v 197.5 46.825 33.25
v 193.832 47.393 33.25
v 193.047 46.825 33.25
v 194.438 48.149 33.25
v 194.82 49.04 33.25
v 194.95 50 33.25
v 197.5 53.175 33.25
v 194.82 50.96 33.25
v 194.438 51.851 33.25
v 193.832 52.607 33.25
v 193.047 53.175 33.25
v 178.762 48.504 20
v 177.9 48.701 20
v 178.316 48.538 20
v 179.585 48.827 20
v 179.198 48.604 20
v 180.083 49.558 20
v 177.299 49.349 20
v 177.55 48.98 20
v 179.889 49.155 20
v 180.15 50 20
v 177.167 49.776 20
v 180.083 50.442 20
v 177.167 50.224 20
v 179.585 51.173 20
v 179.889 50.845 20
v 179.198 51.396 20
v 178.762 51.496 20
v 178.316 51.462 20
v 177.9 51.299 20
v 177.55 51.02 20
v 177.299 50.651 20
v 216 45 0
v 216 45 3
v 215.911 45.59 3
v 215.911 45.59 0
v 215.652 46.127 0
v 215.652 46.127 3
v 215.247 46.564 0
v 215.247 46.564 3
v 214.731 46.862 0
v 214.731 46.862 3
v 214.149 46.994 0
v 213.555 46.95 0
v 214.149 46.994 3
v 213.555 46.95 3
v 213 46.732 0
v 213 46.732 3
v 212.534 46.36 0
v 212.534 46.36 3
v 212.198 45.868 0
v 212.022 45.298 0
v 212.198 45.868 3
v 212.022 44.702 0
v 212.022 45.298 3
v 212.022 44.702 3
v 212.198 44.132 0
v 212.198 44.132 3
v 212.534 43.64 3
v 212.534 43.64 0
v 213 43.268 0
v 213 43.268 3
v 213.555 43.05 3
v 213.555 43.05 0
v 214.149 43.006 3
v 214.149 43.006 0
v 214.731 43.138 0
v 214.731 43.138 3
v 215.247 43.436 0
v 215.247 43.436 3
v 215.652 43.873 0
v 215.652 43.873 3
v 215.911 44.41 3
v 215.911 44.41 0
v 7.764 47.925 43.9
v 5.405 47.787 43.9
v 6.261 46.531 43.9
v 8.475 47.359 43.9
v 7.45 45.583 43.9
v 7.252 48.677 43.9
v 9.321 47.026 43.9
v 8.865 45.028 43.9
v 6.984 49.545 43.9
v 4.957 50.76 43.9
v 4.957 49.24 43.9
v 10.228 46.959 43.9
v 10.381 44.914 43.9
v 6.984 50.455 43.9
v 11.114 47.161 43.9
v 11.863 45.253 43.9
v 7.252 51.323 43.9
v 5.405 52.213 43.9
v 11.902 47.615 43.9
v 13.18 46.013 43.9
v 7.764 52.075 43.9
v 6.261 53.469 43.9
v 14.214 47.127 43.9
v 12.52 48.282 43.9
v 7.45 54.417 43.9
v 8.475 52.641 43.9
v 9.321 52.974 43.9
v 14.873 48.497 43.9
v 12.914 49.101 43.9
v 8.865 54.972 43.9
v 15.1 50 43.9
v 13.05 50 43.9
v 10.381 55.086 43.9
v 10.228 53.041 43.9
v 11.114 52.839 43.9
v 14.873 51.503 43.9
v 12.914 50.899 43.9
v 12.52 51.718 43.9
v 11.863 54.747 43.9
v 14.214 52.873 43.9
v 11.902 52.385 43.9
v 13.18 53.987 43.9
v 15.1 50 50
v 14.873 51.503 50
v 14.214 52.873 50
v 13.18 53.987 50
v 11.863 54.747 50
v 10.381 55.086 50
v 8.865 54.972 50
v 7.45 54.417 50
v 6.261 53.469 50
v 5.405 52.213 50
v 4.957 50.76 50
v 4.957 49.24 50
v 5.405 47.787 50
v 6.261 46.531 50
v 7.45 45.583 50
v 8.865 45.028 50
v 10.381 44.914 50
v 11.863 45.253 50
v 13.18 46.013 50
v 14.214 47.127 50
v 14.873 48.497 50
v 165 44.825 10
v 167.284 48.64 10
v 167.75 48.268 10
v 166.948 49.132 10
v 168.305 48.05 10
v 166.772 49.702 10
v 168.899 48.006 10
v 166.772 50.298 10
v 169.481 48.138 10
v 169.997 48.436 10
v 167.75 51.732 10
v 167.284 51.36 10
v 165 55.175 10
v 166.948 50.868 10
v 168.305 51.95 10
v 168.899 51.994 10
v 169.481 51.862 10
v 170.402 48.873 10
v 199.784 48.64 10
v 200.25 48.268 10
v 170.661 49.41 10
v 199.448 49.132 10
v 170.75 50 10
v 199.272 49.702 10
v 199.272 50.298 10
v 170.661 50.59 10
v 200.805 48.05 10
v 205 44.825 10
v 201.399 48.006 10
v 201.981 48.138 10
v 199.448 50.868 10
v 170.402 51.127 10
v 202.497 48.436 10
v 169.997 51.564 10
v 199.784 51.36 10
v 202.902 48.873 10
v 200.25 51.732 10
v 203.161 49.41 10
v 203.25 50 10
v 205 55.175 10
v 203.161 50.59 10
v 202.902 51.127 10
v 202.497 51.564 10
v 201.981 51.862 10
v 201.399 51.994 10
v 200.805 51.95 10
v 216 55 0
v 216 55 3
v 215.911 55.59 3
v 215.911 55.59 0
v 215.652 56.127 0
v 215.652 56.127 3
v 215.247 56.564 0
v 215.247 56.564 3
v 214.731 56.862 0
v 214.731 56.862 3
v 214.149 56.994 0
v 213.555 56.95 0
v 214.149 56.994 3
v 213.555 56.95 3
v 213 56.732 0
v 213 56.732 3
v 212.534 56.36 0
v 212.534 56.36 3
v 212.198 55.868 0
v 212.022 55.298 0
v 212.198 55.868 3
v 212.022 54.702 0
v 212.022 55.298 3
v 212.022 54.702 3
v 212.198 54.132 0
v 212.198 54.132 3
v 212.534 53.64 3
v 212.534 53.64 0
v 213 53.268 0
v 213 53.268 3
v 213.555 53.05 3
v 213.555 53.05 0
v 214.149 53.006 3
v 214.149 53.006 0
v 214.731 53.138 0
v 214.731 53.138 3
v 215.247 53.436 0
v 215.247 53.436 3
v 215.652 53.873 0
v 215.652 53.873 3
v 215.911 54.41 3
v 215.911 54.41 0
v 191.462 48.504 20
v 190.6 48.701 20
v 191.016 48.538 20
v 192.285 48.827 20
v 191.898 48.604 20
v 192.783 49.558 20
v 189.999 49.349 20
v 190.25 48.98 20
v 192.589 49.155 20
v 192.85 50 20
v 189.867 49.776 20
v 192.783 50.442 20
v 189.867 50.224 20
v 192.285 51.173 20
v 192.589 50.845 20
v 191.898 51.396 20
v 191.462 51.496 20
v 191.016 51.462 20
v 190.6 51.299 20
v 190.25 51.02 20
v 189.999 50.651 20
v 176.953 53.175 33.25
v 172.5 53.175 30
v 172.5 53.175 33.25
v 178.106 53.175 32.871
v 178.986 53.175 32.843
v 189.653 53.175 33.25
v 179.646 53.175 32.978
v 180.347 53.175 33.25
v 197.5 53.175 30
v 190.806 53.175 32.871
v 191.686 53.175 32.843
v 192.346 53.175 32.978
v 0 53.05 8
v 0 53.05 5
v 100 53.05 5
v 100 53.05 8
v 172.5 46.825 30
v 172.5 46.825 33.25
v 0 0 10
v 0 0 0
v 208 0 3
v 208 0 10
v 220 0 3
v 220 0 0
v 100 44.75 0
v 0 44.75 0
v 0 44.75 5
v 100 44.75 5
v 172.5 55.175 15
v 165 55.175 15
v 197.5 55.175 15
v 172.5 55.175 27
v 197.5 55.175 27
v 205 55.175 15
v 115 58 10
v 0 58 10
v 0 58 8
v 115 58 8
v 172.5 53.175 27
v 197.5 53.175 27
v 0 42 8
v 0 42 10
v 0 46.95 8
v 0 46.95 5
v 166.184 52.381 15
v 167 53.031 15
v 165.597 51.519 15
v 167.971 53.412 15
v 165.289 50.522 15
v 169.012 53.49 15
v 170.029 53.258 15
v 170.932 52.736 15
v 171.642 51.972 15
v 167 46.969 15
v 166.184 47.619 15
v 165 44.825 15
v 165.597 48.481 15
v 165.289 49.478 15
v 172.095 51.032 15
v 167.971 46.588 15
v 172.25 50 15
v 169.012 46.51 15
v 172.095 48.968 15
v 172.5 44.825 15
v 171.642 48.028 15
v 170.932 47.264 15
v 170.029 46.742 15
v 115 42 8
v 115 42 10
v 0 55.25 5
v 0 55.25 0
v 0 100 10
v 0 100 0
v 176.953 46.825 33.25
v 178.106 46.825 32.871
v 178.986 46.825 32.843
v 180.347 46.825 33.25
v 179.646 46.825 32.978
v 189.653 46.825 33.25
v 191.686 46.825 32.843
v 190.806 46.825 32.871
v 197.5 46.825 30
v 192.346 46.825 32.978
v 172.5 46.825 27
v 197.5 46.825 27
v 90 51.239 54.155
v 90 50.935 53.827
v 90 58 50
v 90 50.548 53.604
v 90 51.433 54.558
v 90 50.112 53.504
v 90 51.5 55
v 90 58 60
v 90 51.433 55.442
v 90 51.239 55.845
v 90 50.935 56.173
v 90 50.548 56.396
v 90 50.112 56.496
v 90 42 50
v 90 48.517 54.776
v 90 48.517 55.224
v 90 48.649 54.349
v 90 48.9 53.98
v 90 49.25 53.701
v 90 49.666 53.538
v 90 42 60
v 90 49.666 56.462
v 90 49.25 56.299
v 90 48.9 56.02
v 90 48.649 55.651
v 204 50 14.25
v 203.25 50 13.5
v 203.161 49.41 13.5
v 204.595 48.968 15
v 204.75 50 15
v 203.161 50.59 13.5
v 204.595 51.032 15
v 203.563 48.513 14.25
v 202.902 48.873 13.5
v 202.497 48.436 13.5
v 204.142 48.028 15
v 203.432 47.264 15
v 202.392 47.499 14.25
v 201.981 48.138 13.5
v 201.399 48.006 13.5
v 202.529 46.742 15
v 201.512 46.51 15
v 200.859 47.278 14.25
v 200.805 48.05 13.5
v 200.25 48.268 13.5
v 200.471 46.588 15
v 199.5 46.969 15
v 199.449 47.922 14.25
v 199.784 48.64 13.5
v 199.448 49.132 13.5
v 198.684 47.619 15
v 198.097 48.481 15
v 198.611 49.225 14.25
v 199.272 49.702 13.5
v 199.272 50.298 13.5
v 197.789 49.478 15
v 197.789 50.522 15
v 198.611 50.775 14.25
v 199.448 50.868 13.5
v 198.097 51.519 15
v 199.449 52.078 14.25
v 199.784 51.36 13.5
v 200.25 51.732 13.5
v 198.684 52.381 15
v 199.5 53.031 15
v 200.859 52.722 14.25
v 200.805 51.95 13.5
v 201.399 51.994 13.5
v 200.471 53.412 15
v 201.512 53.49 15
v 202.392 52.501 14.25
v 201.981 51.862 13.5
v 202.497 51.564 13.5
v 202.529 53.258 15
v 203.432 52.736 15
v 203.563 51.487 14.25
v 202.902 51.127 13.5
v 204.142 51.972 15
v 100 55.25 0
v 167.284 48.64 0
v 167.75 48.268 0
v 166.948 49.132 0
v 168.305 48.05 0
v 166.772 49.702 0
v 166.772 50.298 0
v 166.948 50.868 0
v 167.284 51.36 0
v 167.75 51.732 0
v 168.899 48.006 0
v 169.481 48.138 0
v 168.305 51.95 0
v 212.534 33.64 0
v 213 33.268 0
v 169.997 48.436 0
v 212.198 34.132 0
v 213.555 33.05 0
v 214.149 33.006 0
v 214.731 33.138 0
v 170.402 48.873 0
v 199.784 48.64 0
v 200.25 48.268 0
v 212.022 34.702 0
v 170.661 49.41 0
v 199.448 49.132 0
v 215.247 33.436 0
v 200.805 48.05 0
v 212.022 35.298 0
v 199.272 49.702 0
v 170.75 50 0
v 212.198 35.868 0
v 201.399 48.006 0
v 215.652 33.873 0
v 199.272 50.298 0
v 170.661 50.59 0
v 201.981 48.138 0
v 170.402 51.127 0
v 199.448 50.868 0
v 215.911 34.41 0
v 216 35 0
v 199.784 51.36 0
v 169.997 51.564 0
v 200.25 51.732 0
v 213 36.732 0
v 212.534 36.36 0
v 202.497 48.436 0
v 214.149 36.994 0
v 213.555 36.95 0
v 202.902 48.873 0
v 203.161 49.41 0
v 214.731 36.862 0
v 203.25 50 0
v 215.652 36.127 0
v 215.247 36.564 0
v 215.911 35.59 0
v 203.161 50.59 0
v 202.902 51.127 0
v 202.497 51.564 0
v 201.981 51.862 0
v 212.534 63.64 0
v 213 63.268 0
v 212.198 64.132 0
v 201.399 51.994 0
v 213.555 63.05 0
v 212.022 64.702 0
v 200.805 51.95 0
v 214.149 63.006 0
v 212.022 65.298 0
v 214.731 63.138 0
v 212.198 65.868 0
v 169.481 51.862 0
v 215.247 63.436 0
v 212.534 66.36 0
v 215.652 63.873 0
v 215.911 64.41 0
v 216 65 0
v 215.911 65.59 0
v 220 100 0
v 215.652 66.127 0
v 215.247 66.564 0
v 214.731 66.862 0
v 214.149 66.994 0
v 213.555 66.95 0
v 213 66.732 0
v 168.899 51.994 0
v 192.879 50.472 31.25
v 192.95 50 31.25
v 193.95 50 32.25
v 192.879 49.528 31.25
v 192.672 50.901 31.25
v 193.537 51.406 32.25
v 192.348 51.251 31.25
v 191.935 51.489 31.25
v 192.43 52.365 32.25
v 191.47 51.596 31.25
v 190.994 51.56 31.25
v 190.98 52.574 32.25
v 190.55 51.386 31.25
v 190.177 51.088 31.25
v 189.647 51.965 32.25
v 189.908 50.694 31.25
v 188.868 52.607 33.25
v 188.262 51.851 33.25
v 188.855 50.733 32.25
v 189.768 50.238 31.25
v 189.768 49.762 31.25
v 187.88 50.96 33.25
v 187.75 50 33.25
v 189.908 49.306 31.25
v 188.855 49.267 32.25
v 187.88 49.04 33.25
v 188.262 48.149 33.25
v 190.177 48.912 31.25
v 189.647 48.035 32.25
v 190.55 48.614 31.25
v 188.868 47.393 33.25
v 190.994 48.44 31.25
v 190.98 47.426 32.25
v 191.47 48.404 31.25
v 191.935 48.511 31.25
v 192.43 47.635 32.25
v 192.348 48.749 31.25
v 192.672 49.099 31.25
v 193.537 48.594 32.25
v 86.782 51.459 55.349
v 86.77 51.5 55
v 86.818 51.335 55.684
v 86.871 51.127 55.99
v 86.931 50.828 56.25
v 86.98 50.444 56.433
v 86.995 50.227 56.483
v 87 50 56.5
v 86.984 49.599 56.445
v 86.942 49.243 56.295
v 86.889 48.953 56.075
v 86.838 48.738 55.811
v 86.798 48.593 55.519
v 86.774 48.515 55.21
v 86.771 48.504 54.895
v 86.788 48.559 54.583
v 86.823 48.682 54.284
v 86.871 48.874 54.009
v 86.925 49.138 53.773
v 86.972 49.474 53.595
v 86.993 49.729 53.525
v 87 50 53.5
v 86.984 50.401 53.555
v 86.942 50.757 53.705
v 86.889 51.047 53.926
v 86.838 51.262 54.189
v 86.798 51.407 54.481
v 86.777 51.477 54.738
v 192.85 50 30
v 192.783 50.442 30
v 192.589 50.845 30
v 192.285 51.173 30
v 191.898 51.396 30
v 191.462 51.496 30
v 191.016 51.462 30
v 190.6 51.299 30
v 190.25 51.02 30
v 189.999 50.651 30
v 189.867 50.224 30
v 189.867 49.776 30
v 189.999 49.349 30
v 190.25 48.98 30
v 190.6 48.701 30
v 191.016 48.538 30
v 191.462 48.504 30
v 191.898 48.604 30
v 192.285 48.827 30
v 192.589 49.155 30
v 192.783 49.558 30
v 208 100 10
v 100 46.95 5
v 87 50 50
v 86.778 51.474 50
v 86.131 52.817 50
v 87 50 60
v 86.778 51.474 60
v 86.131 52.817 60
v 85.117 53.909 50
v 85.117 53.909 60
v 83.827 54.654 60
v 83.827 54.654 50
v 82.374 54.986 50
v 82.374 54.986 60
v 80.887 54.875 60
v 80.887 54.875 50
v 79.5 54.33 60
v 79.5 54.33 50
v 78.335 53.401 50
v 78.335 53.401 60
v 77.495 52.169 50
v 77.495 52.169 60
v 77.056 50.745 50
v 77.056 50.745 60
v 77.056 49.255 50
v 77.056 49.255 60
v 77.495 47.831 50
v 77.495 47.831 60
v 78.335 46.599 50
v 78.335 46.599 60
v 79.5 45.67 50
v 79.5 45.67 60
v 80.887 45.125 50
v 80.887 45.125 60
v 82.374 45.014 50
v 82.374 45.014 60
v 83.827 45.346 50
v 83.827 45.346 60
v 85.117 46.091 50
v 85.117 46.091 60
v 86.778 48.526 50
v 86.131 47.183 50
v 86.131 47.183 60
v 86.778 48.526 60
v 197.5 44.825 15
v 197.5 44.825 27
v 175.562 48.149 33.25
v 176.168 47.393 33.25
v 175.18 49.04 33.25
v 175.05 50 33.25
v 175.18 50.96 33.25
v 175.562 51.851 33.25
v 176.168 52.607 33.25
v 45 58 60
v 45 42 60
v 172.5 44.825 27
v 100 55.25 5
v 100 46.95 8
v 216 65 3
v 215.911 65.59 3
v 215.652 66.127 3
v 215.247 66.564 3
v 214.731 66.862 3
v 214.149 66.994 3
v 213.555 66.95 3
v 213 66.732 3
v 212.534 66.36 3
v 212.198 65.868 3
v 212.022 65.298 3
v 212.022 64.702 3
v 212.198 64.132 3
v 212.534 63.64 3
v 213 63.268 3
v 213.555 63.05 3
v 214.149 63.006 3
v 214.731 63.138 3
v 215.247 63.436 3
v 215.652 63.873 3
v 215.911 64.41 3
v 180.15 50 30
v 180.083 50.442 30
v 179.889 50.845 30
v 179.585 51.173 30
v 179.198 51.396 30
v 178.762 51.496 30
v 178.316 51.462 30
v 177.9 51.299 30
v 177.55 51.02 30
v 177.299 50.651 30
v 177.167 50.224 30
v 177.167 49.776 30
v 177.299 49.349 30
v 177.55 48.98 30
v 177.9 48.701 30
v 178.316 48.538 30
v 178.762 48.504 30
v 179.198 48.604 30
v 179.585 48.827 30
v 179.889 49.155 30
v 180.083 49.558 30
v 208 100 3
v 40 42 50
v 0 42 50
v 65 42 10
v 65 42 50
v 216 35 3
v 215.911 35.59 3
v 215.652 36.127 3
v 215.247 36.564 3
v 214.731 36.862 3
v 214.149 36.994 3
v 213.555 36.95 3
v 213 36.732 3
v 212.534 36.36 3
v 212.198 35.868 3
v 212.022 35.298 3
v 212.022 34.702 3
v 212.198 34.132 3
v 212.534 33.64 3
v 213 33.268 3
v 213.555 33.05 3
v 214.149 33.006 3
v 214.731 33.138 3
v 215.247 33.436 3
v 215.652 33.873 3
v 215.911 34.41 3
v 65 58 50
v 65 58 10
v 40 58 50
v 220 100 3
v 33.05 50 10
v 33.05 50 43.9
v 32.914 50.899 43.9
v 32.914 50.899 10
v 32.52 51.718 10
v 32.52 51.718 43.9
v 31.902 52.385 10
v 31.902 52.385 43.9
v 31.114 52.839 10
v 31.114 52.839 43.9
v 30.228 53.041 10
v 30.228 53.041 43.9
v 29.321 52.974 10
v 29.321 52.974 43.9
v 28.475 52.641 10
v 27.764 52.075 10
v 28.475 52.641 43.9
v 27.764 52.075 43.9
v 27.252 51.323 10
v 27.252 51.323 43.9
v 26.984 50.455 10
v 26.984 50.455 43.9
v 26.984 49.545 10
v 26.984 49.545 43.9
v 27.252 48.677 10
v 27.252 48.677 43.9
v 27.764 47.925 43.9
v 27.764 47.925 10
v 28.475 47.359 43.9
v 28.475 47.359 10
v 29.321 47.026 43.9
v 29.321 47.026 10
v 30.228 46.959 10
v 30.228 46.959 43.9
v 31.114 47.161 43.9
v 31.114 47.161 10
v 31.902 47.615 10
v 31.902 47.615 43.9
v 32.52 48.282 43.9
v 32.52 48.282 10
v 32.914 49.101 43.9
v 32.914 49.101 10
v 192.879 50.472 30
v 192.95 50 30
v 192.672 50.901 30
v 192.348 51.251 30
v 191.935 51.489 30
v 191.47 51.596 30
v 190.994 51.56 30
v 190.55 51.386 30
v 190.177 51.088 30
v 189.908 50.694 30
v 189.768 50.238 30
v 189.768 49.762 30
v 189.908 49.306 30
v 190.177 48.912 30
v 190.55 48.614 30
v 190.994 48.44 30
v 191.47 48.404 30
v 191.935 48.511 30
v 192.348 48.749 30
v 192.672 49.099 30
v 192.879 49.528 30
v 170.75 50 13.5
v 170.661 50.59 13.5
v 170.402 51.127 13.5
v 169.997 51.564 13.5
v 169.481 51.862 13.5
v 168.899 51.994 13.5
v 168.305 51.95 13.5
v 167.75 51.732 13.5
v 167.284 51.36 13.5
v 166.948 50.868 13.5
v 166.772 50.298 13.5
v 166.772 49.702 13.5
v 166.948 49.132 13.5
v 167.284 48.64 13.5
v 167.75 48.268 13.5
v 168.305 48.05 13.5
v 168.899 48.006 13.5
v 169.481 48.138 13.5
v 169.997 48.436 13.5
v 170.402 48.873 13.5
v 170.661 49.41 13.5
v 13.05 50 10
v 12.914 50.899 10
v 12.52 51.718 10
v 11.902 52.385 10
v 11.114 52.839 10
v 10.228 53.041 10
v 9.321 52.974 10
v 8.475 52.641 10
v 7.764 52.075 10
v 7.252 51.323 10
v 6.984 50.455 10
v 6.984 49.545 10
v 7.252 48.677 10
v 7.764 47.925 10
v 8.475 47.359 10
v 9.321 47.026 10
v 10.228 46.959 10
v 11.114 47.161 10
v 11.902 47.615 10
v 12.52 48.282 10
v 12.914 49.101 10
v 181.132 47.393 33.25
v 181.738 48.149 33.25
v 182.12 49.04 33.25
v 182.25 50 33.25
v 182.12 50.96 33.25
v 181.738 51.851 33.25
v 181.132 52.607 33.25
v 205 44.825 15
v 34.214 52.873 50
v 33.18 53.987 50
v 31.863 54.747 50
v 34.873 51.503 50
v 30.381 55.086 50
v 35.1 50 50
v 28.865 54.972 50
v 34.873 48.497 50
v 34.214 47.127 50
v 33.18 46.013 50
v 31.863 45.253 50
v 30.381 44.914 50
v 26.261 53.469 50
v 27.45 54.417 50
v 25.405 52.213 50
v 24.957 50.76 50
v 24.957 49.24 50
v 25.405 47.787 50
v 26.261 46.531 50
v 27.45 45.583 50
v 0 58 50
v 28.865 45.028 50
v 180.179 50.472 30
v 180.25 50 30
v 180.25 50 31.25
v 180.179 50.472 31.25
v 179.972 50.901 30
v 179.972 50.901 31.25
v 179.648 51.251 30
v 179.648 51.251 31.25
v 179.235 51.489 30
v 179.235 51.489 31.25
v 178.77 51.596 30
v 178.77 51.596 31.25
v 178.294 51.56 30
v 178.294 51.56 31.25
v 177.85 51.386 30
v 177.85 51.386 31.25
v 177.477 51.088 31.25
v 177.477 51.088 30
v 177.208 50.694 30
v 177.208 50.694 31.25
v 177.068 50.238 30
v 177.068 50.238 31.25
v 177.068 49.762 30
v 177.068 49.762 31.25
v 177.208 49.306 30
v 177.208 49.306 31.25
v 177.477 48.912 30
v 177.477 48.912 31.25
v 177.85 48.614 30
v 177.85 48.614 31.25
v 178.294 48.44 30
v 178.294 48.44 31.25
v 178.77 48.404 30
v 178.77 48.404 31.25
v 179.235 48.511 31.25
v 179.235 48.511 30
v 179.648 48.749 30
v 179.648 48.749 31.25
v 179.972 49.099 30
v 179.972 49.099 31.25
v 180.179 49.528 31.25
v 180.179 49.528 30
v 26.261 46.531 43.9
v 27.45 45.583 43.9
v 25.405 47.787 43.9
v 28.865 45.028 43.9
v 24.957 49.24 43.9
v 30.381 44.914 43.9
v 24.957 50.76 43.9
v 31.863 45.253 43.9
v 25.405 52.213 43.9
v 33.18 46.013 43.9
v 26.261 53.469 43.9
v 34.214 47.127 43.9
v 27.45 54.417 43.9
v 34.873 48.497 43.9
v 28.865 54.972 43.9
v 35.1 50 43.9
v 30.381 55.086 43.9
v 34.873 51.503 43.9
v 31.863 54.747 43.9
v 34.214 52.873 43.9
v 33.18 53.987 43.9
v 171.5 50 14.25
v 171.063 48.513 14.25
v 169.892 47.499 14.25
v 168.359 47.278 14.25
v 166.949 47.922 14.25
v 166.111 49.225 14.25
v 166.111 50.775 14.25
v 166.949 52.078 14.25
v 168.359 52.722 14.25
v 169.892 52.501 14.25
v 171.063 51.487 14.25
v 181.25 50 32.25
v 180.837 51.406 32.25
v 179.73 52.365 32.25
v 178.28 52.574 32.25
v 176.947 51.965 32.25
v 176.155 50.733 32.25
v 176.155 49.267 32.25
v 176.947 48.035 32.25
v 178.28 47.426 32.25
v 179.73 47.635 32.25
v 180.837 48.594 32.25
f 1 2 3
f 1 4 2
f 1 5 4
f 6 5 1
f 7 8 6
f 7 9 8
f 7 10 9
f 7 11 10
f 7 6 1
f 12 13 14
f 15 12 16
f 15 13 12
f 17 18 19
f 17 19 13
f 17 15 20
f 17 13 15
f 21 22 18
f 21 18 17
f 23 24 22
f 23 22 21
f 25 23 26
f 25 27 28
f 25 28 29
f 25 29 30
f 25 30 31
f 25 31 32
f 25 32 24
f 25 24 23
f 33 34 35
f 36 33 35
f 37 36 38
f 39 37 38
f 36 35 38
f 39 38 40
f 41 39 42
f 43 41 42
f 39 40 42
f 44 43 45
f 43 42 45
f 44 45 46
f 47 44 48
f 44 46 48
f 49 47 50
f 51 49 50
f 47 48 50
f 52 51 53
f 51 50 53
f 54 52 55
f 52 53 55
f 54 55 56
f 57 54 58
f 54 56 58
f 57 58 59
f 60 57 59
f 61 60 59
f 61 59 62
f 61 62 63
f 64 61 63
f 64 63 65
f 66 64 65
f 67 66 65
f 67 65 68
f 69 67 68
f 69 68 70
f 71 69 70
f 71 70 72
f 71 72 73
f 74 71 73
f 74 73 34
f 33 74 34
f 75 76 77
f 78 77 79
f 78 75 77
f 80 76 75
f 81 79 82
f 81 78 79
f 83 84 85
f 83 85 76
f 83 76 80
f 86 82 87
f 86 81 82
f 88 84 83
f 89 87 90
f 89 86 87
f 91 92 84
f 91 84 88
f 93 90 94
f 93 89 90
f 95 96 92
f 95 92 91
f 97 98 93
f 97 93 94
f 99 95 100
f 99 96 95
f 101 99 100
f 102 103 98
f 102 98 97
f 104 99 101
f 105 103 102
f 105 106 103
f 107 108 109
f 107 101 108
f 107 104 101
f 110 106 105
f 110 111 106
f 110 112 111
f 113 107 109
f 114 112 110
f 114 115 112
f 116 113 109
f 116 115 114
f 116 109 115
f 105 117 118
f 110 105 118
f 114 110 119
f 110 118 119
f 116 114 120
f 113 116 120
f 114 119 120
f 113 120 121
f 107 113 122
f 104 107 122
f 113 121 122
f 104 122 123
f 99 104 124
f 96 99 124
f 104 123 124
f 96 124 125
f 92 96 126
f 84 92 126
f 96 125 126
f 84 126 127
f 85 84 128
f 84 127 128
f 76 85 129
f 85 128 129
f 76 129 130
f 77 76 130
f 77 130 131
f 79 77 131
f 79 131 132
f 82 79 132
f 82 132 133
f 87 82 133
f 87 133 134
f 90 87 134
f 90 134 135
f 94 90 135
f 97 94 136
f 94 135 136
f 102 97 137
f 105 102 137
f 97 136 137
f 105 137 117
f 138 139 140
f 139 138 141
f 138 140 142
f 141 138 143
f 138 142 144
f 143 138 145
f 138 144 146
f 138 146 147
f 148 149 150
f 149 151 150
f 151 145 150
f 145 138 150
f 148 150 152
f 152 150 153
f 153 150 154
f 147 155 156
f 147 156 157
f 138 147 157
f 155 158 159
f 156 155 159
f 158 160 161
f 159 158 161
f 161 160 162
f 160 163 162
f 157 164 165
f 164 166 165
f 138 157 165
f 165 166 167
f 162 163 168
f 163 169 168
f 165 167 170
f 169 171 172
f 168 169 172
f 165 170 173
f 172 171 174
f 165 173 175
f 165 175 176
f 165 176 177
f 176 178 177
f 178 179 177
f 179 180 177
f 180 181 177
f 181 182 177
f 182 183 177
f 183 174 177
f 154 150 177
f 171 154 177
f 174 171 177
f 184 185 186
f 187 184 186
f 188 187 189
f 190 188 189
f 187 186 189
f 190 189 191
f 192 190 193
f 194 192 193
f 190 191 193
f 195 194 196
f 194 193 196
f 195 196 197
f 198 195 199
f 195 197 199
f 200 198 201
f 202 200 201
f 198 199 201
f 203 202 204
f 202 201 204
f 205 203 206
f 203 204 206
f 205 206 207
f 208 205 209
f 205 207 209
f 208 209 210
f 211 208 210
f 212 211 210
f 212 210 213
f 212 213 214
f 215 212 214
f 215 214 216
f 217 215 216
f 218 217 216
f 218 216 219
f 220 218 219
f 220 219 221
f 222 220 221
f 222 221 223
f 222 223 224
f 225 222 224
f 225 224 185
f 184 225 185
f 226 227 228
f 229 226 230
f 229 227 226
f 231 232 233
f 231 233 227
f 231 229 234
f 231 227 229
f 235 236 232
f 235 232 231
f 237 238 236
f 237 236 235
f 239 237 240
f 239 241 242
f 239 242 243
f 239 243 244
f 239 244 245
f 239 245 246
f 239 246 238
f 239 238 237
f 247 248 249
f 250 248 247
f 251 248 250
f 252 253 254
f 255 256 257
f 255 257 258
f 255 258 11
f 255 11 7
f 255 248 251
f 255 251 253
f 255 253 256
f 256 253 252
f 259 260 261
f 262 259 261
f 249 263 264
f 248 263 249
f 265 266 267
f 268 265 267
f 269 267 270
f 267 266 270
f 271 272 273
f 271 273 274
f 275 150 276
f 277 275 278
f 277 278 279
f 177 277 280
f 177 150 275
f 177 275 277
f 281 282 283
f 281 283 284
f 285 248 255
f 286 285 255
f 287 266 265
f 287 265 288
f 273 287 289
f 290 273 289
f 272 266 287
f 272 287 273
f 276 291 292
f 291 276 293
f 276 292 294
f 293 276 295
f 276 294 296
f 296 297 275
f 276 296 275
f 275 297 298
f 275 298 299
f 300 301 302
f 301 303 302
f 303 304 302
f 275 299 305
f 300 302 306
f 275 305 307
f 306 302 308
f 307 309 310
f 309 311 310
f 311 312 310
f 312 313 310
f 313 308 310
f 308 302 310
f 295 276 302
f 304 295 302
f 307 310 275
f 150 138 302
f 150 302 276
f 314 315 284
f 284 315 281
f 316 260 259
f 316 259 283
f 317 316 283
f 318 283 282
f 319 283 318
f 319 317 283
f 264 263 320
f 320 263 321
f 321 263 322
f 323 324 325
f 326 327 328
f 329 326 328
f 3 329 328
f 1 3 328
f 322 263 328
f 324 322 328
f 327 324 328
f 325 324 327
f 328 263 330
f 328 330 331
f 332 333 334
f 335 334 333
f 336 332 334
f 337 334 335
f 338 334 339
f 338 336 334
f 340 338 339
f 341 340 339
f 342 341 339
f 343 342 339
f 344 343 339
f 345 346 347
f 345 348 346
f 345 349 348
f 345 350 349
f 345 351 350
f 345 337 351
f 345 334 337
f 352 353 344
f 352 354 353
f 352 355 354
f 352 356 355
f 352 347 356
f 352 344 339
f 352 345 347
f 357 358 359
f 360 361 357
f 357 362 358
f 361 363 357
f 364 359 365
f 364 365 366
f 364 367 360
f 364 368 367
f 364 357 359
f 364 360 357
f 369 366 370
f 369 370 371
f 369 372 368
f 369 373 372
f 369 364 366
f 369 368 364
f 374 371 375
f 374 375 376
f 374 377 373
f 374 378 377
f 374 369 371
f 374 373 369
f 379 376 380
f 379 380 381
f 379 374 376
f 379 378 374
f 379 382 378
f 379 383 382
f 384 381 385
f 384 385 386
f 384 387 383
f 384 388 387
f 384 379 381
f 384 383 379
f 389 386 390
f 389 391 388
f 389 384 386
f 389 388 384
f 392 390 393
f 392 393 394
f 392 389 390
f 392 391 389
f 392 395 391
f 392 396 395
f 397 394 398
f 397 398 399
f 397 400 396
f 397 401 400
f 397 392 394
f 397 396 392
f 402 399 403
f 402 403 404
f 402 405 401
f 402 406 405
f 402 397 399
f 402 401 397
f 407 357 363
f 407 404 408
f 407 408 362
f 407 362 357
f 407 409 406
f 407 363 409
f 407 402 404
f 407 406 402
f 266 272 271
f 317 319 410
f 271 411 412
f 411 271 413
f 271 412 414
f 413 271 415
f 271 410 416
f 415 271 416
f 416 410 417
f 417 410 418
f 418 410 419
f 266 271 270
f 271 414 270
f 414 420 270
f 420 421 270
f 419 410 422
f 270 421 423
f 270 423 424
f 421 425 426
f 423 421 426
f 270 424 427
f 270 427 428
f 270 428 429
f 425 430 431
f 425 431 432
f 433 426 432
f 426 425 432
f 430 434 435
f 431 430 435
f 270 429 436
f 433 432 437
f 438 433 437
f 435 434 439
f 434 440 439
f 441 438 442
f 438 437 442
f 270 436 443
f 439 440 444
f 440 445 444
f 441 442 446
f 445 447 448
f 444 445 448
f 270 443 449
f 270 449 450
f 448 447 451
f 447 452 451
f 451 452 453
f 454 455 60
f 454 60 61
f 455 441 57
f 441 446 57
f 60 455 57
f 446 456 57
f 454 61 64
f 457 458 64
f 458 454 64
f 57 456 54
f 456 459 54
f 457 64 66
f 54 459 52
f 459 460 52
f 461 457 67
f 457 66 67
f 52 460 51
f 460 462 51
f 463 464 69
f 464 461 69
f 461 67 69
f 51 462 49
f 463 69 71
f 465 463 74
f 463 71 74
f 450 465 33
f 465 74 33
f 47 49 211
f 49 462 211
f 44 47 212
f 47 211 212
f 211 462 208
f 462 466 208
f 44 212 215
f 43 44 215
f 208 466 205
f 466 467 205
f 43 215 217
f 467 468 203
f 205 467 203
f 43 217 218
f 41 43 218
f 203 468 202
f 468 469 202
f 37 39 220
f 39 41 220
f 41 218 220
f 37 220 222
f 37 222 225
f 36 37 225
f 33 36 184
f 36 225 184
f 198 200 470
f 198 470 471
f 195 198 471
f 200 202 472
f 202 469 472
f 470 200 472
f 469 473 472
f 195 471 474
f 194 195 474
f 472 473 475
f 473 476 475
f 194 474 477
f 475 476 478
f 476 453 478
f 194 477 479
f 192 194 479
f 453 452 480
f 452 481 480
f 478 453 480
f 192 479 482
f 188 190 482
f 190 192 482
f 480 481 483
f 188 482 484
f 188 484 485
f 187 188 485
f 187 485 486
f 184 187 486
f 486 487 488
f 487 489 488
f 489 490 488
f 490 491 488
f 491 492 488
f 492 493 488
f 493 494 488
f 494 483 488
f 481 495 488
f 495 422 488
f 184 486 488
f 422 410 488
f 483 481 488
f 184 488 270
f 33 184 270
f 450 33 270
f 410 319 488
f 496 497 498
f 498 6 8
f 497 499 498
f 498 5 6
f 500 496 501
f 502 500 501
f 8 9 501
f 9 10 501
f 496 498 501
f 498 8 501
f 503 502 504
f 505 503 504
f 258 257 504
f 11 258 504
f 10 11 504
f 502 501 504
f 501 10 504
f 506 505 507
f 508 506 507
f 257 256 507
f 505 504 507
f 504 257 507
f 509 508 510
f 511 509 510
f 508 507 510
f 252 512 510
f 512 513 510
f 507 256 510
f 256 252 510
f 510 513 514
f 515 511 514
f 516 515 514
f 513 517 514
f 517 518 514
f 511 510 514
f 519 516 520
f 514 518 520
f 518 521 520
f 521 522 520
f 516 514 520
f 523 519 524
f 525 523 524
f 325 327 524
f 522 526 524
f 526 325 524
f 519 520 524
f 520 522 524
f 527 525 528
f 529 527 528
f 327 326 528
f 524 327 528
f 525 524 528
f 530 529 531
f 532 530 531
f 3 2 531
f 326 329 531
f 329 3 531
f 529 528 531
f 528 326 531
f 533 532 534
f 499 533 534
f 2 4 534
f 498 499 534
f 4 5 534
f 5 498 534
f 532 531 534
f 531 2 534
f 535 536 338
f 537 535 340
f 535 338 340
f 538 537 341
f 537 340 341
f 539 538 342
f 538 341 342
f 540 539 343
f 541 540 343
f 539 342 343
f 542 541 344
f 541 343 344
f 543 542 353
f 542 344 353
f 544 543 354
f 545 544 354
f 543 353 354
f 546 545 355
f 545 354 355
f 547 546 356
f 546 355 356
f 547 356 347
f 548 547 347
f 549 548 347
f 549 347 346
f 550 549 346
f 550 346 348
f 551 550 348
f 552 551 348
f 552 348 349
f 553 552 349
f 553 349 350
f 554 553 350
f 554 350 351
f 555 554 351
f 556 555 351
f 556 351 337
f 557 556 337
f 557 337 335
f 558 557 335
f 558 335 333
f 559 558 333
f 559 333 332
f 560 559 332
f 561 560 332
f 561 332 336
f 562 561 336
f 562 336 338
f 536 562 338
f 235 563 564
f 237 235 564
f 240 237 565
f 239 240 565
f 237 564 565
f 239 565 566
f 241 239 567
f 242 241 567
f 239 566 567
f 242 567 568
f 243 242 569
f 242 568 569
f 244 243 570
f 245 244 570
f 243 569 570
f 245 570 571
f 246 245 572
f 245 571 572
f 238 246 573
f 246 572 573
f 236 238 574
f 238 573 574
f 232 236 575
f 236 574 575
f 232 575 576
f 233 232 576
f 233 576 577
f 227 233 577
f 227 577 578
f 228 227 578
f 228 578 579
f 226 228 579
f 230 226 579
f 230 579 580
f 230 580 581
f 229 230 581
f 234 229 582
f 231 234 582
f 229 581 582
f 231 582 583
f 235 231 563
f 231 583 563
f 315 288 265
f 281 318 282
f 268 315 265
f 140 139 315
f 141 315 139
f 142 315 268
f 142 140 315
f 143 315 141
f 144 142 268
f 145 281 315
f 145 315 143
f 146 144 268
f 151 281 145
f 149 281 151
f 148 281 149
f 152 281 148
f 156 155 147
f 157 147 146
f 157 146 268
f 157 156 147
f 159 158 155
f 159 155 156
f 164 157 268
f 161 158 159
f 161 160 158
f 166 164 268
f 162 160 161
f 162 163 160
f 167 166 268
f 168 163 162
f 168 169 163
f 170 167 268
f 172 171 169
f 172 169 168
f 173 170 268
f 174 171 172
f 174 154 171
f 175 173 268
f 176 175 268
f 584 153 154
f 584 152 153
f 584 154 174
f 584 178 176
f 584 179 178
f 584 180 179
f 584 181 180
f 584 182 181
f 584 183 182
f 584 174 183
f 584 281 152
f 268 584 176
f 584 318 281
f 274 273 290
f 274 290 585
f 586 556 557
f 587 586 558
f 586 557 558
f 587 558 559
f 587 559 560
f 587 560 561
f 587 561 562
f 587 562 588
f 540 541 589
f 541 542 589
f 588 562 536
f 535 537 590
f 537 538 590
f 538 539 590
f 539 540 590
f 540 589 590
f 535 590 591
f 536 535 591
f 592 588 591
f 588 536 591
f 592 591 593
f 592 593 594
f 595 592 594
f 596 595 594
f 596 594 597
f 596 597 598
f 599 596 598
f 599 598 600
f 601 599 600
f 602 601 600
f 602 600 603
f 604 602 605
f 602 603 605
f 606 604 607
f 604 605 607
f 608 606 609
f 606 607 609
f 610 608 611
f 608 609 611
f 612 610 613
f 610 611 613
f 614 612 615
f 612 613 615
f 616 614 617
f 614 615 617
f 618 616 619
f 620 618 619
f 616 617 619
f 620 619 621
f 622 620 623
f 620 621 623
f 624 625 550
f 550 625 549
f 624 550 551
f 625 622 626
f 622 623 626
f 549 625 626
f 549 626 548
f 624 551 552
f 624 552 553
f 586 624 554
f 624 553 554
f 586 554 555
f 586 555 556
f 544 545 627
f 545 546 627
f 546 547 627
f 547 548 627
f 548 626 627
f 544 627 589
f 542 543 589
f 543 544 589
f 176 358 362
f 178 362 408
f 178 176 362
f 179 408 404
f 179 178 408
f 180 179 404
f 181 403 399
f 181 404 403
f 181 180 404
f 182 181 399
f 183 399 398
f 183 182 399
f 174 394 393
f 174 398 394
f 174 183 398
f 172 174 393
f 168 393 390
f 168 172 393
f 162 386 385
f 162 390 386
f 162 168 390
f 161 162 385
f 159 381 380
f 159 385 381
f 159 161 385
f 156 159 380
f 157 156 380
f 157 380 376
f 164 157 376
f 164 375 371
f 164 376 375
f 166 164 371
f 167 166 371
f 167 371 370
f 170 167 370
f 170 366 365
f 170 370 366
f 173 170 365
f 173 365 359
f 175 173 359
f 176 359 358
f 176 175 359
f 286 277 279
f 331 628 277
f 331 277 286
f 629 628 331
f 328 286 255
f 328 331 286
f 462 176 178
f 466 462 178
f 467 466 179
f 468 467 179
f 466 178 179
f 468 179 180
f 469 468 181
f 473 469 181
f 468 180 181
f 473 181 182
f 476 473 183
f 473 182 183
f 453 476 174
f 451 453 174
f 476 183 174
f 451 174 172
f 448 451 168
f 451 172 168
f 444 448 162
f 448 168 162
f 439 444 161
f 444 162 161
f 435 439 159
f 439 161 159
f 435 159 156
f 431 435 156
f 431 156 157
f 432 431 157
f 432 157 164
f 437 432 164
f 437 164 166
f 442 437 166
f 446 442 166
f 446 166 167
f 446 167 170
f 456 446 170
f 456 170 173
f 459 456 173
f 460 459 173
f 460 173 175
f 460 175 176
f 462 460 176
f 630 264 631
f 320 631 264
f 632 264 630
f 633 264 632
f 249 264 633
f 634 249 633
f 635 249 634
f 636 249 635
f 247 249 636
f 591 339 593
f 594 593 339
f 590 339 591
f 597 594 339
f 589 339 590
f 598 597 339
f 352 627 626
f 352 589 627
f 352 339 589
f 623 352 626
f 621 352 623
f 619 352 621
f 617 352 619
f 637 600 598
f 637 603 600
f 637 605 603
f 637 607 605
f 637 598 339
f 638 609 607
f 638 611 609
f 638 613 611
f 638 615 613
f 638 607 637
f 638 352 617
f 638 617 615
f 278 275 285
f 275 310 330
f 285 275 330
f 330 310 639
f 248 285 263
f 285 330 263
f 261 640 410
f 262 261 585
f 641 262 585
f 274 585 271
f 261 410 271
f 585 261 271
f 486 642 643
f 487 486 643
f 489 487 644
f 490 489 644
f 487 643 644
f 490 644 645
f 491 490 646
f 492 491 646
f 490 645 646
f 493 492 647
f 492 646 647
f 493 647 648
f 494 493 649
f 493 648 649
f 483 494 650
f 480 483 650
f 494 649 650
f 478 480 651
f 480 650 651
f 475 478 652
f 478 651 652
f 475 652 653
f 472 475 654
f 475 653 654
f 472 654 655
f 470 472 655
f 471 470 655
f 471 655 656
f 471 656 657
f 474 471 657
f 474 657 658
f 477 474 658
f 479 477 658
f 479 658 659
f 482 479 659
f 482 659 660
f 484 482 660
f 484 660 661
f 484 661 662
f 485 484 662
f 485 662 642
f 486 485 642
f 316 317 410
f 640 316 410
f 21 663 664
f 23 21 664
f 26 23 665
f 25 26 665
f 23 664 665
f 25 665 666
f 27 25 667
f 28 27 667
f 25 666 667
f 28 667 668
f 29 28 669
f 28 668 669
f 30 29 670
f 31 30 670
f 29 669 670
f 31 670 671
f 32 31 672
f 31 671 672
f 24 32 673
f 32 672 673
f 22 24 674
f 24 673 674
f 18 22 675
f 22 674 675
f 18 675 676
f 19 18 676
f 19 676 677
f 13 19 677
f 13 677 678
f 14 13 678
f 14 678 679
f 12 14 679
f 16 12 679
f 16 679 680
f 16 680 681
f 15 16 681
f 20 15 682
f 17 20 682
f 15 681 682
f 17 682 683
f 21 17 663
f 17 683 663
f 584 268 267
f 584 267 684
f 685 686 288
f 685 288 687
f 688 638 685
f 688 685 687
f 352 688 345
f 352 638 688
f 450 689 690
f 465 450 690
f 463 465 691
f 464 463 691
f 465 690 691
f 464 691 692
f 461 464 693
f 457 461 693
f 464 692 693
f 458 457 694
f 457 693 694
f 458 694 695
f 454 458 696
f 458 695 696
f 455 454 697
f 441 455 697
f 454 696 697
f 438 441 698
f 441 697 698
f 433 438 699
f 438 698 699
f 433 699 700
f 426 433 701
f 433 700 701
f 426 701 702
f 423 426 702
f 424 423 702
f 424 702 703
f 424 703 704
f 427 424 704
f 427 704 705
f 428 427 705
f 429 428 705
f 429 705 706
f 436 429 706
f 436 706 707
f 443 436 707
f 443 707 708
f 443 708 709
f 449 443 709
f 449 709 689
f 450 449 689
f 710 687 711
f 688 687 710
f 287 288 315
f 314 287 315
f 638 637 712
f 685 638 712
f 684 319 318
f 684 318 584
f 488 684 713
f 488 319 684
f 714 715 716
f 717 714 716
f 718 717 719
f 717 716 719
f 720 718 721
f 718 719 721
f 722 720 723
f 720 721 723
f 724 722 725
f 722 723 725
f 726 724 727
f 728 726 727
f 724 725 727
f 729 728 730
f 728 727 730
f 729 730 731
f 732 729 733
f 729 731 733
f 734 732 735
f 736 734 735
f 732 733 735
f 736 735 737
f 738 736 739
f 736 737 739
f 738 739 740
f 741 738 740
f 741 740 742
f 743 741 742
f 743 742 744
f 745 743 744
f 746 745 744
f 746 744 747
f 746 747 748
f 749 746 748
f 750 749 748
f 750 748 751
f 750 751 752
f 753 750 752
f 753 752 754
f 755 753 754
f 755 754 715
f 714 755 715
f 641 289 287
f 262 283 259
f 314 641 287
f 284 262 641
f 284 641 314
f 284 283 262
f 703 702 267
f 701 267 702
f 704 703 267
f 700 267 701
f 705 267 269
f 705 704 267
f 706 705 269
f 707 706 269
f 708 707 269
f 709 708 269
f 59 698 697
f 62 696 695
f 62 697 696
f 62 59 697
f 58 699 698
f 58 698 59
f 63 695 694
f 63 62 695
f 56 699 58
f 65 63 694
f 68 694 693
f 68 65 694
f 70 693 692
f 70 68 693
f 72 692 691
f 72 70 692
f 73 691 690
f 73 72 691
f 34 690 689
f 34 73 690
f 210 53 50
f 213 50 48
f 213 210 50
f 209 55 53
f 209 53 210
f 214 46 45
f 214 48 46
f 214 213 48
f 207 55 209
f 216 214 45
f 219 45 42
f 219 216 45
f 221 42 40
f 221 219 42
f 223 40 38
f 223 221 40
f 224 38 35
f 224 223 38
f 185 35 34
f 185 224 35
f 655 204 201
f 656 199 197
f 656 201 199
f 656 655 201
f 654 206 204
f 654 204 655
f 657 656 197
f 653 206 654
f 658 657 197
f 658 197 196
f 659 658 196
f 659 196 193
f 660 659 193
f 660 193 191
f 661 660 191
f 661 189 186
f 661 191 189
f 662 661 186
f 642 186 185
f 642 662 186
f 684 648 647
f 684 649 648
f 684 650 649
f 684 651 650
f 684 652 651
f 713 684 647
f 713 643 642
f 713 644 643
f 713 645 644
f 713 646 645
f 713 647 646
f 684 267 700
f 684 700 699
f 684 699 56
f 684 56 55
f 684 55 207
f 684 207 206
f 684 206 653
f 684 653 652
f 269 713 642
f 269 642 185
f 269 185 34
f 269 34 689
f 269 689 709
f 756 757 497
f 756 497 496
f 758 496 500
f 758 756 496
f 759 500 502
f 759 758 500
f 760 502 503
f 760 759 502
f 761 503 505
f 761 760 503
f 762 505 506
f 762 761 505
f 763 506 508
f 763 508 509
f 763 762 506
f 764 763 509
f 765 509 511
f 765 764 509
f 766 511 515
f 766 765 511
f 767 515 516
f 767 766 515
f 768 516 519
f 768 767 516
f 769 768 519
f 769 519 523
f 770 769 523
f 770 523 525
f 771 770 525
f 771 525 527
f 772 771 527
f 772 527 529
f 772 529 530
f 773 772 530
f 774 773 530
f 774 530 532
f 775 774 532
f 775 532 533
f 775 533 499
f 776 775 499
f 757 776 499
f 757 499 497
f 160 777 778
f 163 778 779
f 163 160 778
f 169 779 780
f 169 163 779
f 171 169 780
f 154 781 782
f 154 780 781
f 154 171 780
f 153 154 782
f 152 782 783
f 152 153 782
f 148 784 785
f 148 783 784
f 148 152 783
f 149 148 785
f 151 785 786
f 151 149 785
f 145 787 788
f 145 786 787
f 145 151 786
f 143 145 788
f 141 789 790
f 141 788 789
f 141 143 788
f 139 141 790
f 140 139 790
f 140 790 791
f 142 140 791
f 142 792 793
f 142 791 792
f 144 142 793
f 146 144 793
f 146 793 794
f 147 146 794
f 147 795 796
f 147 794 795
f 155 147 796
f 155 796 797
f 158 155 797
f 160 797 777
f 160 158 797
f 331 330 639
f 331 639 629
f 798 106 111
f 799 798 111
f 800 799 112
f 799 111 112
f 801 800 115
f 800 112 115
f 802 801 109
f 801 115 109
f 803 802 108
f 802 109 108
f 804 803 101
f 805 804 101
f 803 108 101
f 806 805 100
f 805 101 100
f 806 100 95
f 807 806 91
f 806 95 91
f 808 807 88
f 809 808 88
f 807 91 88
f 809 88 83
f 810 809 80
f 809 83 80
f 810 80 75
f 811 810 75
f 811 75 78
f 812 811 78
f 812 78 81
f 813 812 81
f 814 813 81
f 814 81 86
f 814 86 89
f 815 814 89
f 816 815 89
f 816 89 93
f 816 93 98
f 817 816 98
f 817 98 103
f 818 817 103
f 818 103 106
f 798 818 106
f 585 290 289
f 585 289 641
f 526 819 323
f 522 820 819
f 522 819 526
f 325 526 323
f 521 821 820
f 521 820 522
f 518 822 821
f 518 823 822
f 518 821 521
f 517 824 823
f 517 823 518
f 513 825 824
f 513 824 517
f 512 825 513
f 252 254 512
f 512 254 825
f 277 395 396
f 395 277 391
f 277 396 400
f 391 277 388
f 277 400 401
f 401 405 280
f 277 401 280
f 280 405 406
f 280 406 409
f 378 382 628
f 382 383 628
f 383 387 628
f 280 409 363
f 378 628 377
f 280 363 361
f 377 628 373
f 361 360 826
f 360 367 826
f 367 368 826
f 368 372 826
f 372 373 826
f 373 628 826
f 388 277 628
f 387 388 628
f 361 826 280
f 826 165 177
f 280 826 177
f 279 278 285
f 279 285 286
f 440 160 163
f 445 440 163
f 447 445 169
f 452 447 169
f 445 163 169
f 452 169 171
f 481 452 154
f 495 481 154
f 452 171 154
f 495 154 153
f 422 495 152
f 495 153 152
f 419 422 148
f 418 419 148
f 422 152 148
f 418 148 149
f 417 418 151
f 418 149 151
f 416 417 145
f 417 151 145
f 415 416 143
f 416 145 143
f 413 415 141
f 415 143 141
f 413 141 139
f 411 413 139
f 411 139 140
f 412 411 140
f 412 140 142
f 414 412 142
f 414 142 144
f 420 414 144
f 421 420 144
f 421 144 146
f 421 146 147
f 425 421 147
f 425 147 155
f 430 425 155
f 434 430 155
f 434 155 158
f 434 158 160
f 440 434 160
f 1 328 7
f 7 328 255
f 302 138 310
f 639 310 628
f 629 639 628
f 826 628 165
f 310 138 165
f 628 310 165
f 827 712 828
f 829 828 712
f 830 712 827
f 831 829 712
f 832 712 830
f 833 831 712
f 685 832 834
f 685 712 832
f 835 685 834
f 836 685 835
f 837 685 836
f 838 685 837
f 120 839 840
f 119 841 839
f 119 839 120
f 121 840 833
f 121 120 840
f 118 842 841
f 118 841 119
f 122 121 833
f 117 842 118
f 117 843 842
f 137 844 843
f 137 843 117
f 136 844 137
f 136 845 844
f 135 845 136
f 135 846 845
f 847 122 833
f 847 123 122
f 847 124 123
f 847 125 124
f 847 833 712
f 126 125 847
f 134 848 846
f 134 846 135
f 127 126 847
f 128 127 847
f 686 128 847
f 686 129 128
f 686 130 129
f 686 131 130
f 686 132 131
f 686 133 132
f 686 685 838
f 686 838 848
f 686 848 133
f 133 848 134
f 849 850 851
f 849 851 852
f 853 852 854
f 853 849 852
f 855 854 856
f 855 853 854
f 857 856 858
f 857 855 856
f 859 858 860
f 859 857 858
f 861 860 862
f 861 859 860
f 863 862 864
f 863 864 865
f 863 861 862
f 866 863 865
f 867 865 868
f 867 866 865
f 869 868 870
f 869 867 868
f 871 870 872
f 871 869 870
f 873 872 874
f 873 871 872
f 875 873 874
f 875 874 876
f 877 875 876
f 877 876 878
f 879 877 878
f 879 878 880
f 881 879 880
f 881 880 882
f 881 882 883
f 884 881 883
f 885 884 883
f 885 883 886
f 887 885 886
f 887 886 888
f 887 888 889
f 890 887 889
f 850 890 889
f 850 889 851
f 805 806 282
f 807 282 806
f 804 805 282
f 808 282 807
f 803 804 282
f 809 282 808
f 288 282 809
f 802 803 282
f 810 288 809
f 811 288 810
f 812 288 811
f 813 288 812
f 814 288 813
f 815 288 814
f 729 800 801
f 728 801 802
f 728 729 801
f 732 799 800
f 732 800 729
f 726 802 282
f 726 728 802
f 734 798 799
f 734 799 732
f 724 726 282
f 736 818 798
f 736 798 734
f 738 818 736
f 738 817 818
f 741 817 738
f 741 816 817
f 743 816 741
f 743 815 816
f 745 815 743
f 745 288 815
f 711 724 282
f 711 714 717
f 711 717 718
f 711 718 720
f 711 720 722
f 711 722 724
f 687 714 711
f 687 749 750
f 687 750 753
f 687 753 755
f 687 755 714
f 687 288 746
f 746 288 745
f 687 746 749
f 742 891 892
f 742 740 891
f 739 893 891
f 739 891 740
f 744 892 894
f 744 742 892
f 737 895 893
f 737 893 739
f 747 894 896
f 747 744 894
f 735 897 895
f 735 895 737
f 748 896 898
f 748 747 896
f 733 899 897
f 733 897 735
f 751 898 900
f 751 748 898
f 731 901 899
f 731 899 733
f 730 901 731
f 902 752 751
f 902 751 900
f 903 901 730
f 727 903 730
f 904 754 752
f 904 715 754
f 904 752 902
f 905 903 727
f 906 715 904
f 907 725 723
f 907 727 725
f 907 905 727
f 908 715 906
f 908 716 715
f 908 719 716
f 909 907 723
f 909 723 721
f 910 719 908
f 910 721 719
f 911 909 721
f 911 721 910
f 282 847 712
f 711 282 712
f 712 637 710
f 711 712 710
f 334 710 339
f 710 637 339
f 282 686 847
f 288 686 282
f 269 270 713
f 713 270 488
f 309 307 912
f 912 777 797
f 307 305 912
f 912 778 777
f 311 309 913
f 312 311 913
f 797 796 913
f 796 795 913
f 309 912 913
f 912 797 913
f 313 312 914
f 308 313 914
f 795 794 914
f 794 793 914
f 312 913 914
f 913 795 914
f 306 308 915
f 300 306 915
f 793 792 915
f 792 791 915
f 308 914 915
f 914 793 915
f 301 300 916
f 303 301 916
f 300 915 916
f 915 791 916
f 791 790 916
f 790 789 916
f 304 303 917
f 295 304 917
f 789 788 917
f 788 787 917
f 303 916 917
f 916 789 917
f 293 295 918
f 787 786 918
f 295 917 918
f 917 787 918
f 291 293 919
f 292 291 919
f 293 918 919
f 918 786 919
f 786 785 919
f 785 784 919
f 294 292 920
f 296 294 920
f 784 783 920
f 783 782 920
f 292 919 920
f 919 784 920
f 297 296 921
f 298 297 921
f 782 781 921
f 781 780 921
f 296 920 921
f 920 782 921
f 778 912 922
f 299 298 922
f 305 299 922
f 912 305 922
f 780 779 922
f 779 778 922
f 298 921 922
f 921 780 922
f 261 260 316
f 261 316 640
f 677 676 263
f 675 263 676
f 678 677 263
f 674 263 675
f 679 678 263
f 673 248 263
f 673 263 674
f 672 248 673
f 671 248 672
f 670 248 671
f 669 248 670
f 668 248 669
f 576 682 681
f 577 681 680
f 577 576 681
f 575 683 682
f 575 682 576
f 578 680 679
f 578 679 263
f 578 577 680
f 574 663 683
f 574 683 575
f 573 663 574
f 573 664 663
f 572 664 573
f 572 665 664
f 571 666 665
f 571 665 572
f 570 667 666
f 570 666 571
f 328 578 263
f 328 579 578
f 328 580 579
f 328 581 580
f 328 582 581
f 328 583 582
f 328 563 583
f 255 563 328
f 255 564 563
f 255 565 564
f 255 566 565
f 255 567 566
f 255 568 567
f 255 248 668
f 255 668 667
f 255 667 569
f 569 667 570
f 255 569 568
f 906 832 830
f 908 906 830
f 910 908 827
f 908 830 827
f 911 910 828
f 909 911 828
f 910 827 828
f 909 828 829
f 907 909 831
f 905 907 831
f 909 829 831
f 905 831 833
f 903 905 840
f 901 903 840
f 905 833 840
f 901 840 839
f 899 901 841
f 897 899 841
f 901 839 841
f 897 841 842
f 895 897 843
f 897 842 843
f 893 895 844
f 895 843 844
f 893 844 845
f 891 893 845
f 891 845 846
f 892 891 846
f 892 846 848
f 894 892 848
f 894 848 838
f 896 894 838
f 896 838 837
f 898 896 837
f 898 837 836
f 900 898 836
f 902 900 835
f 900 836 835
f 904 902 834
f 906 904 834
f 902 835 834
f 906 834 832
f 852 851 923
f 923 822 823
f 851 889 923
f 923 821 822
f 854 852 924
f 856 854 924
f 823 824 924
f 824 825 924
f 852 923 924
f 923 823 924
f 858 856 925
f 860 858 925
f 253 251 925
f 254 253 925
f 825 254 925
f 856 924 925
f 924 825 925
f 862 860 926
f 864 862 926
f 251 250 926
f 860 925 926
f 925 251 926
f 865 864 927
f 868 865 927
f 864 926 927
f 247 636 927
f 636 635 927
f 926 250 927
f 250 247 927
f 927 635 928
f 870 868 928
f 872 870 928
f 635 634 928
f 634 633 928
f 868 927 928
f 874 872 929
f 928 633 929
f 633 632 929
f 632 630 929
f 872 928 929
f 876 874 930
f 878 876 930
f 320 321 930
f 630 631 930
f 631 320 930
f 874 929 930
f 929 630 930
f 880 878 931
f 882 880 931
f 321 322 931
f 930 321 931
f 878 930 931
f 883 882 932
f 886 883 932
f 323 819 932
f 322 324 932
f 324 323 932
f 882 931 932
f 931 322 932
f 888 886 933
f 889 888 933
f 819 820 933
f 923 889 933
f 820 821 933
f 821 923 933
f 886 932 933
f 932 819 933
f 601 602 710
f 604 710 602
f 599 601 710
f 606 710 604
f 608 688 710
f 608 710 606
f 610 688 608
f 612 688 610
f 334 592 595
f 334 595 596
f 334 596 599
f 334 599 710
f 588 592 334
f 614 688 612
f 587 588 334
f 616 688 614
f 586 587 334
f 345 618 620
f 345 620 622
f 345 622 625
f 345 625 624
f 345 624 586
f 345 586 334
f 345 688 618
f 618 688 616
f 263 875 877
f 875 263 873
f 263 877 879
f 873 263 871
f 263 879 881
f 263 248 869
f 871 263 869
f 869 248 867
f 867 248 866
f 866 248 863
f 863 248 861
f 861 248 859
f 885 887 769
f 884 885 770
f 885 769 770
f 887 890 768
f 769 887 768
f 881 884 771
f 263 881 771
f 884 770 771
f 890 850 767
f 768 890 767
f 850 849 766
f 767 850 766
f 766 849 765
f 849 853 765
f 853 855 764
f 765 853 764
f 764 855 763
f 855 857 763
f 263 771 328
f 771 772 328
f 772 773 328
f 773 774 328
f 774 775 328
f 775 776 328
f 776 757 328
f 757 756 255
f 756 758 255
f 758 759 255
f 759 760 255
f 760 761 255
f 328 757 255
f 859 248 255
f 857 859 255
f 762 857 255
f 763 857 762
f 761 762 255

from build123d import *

# Parameters (mm, degrees)
F0_W      = 220
F0_H      = 100
F1_DEPTH  = 10
F2_W      = 40
F2_H      = 10.35
F2_R      = 2
F3_DEPTH  = 20
F4_W      = 7.5
F4_H      = 15
F5_DEPTH  = 55.176
F6_R      = 1.5
F7_DEPTH  = 10
F8_W      = 25
F8_H      = 2
F9_DEPTH  = 3
F10_SIZE  = 1.5
F11_R     = 2
F12_DEPTH = 10.001
F13_W     = 25
F13_H     = 6.35
F13_R     = 1.6
F14_DEPTH = 3.25
F16_W     = 100
F16_H     = 6.1
F17_DEPTH = 25
F18_W     = 100
F18_H     = 10.5
F19_DEPTH = 5
F20_R     = 2
F21_DEPTH = 10.001
F24_DEPTH = 8
F25_R     = 3.05
F26_DEPTH = 40
F27_R     = 5.1
F28_DEPTH = 6.1
F29_R     = 5
F30_DEPTH = 10
F31_R     = 1.5
F32_DEPTH = 3.2313040929
F33_W     = 12
F33_H     = 100
F34_DEPTH = 7
F35_W     = 115
F35_H     = 16
F36_DEPTH = 2


# Not quite as in the source:
# - a fillet or chamfer that OpenCascade refuses, or shapes differently, is made with other operations: its cross-section is extruded or revolved along the edge and cut away or added


with BuildPart() as f1:
    # F0 (on Top) → F1 (new body)
    with BuildSketch(Plane.XY):
        with Locations((110, 50)):
            Rectangle(F0_W, F0_H)
    extrude(amount=F1_DEPTH)

    # F11 (on face) → F12 (cut, through all)
    with BuildSketch(Plane.XY.offset(10)):
        with Locations((168.75, 50)):
            Circle(F11_R)
        with Locations((201.25, 50)):
            Circle(F11_R)
        with Locations((214, 65)):
            Circle(F11_R)
        with Locations((214, 55)):
            Circle(F11_R)
        with Locations((214, 45)):
            Circle(F11_R)
        with Locations((214, 35)):
            Circle(F11_R)
    extrude(amount=-F12_DEPTH, mode=Mode.SUBTRACT)

    # F16 (on face) → F17 (cut)
    with BuildSketch(Plane(origin=(0, 0, 0), x_dir=(1, 0, 0), z_dir=(0, 0, -1))):
        with Locations((50, -50)):
            Rectangle(F16_W, F16_H)
    extrude(amount=-F17_DEPTH, mode=Mode.SUBTRACT)

    # F18 (on face) → F19 (cut)
    with BuildSketch(Plane(origin=(0, 0, 0), x_dir=(1, 0, 0), z_dir=(0, 0, -1))):
        with Locations((50, -50)):
            Rectangle(F18_W, F18_H)
    extrude(amount=-F19_DEPTH, mode=Mode.SUBTRACT)

    # F20 (on face) → F21 (cut, through all)
    with BuildSketch(Plane.XY.offset(10)):
        with Locations((168.75, 50)):
            Circle(F20_R)
        with Locations((201.25, 50)):
            Circle(F20_R)
    extrude(amount=-F21_DEPTH, mode=Mode.SUBTRACT)

    # F33 (on face) → F34 (cut)
    with BuildSketch(Plane.XY.offset(10)):
        with Locations((214, 50)):
            Rectangle(F33_W, F33_H)
    extrude(amount=-F34_DEPTH, mode=Mode.SUBTRACT)

    # F35 (on face) → F36 (cut)
    with BuildSketch(Plane.XY.offset(10)):
        with Locations((57.5, 50)):
            Rectangle(F35_W, F35_H)
    extrude(amount=-F36_DEPTH, mode=Mode.SUBTRACT)


with BuildPart() as f3:
    # F2 (on face) → F3 (new body)
    with BuildSketch(Plane.XY.offset(10)):
        with Locations((185, 50)):
            Rectangle(F2_W, F2_H)
        with Locations((168.75, 50)):
            Circle(F2_R, mode=Mode.SUBTRACT)
        with Locations((201.25, 50)):
            Circle(F2_R, mode=Mode.SUBTRACT)
    extrude(amount=F3_DEPTH)

    # F4 (on face) → F5 (cut, through all)
    with BuildSketch(Plane.XZ.offset(-44.825)):
        with Locations((168.75, 22.5)):
            Rectangle(F4_W, F4_H)
        with Locations((201.25, 22.5)):
            Rectangle(F4_W, F4_H)
    extrude(amount=-F5_DEPTH, mode=Mode.SUBTRACT)

    # F6 (on face) → F7 (cut)
    with BuildSketch(Plane.XY.offset(30)):
        with Locations((178.65, 50)):
            Circle(F6_R)
        with Locations((191.35, 50)):
            Circle(F6_R)
    extrude(amount=-F7_DEPTH, mode=Mode.SUBTRACT)

    # F8 (on face) → F9 (cut)
    with BuildSketch(Plane.XY.offset(30)):
        with Locations((185, 54.175)):
            Rectangle(F8_W, F8_H)
        with Locations((185, 45.825)):
            Rectangle(F8_W, F8_H)
    extrude(amount=-F9_DEPTH, mode=Mode.SUBTRACT)

    # F10
    f10_edges = [f3.edges().sort_by_distance(p)[0] for p in [
        (166.75, 50, 15),
        (199.25, 50, 15),
    ]]
    chamfer(f10_edges, length=F10_SIZE)


with BuildPart() as f14:
    # F13 (on face) → F14 (new body)
    with BuildSketch(Plane.XY.offset(30)):
        with Locations((185, 50)):
            Rectangle(F13_W, F13_H)
        with Locations((178.65, 50)):
            Circle(F13_R, mode=Mode.SUBTRACT)
        with Locations((191.35, 50)):
            Circle(F13_R, mode=Mode.SUBTRACT)
    extrude(amount=F14_DEPTH)

    # F15: chamfer of 2 on 2 edges, made by hand

    # F15_s1 → F15_t2 (revolve, cut)
    with BuildSketch(Plane.XZ.offset(-50)):
        Polygon((180.25, 31.25), (182.25, 33.25), (180.25, 33.25), align=None)
    revolve(axis=Axis((178.65, 50, 33.25), (0, 0, 1)), mode=Mode.SUBTRACT)

    # F15_s3 → F15_t4 (revolve, cut)
    with BuildSketch(Plane.XZ.offset(-50)):
        Polygon((192.95, 31.25), (194.95, 33.25), (192.95, 33.25), align=None)
    revolve(axis=Axis((191.35, 50, 33.25), (0, 0, 1)), mode=Mode.SUBTRACT)


with BuildPart() as f24:
    # F23 (on offset) → F24 (new body, symmetric)
    with BuildSketch(Plane.XZ.offset(-50)):
        Polygon((0, 50), (0, 10), (65, 10), (65, 50), (90, 50), (90, 60), (45, 60), (40, 50), align=None)
    extrude(amount=F24_DEPTH, both=True)

    # F25 (on face) → F26 (cut, through all)
    with BuildSketch(Plane.XY.offset(50)):
        with Locations((10, 50)):
            Circle(F25_R)
        with Locations((30, 50)):
            Circle(F25_R)
    extrude(amount=-F26_DEPTH, mode=Mode.SUBTRACT)

    # F27 (on face) → F28 (cut)
    with BuildSketch(Plane.XY.offset(50)):
        with Locations((10, 50)):
            Circle(F27_R)
        with Locations((30, 50)):
            Circle(F27_R)
    extrude(amount=-F28_DEPTH, mode=Mode.SUBTRACT)

    # F29 (on face) → F30 (cut, through all)
    with BuildSketch(Plane.XY.offset(60)):
        with Locations((82, 50)):
            Circle(F29_R)
    extrude(amount=-F30_DEPTH, mode=Mode.SUBTRACT)

    # F31 (on face) → F32 (cut, through all)
    with BuildSketch(Plane.YZ.offset(90)):
        with Locations((50, 55)):
            Circle(F31_R)
    extrude(amount=-F32_DEPTH, mode=Mode.SUBTRACT)


solid = Compound([f1.part, f3.part, f14.part, f24.part])
